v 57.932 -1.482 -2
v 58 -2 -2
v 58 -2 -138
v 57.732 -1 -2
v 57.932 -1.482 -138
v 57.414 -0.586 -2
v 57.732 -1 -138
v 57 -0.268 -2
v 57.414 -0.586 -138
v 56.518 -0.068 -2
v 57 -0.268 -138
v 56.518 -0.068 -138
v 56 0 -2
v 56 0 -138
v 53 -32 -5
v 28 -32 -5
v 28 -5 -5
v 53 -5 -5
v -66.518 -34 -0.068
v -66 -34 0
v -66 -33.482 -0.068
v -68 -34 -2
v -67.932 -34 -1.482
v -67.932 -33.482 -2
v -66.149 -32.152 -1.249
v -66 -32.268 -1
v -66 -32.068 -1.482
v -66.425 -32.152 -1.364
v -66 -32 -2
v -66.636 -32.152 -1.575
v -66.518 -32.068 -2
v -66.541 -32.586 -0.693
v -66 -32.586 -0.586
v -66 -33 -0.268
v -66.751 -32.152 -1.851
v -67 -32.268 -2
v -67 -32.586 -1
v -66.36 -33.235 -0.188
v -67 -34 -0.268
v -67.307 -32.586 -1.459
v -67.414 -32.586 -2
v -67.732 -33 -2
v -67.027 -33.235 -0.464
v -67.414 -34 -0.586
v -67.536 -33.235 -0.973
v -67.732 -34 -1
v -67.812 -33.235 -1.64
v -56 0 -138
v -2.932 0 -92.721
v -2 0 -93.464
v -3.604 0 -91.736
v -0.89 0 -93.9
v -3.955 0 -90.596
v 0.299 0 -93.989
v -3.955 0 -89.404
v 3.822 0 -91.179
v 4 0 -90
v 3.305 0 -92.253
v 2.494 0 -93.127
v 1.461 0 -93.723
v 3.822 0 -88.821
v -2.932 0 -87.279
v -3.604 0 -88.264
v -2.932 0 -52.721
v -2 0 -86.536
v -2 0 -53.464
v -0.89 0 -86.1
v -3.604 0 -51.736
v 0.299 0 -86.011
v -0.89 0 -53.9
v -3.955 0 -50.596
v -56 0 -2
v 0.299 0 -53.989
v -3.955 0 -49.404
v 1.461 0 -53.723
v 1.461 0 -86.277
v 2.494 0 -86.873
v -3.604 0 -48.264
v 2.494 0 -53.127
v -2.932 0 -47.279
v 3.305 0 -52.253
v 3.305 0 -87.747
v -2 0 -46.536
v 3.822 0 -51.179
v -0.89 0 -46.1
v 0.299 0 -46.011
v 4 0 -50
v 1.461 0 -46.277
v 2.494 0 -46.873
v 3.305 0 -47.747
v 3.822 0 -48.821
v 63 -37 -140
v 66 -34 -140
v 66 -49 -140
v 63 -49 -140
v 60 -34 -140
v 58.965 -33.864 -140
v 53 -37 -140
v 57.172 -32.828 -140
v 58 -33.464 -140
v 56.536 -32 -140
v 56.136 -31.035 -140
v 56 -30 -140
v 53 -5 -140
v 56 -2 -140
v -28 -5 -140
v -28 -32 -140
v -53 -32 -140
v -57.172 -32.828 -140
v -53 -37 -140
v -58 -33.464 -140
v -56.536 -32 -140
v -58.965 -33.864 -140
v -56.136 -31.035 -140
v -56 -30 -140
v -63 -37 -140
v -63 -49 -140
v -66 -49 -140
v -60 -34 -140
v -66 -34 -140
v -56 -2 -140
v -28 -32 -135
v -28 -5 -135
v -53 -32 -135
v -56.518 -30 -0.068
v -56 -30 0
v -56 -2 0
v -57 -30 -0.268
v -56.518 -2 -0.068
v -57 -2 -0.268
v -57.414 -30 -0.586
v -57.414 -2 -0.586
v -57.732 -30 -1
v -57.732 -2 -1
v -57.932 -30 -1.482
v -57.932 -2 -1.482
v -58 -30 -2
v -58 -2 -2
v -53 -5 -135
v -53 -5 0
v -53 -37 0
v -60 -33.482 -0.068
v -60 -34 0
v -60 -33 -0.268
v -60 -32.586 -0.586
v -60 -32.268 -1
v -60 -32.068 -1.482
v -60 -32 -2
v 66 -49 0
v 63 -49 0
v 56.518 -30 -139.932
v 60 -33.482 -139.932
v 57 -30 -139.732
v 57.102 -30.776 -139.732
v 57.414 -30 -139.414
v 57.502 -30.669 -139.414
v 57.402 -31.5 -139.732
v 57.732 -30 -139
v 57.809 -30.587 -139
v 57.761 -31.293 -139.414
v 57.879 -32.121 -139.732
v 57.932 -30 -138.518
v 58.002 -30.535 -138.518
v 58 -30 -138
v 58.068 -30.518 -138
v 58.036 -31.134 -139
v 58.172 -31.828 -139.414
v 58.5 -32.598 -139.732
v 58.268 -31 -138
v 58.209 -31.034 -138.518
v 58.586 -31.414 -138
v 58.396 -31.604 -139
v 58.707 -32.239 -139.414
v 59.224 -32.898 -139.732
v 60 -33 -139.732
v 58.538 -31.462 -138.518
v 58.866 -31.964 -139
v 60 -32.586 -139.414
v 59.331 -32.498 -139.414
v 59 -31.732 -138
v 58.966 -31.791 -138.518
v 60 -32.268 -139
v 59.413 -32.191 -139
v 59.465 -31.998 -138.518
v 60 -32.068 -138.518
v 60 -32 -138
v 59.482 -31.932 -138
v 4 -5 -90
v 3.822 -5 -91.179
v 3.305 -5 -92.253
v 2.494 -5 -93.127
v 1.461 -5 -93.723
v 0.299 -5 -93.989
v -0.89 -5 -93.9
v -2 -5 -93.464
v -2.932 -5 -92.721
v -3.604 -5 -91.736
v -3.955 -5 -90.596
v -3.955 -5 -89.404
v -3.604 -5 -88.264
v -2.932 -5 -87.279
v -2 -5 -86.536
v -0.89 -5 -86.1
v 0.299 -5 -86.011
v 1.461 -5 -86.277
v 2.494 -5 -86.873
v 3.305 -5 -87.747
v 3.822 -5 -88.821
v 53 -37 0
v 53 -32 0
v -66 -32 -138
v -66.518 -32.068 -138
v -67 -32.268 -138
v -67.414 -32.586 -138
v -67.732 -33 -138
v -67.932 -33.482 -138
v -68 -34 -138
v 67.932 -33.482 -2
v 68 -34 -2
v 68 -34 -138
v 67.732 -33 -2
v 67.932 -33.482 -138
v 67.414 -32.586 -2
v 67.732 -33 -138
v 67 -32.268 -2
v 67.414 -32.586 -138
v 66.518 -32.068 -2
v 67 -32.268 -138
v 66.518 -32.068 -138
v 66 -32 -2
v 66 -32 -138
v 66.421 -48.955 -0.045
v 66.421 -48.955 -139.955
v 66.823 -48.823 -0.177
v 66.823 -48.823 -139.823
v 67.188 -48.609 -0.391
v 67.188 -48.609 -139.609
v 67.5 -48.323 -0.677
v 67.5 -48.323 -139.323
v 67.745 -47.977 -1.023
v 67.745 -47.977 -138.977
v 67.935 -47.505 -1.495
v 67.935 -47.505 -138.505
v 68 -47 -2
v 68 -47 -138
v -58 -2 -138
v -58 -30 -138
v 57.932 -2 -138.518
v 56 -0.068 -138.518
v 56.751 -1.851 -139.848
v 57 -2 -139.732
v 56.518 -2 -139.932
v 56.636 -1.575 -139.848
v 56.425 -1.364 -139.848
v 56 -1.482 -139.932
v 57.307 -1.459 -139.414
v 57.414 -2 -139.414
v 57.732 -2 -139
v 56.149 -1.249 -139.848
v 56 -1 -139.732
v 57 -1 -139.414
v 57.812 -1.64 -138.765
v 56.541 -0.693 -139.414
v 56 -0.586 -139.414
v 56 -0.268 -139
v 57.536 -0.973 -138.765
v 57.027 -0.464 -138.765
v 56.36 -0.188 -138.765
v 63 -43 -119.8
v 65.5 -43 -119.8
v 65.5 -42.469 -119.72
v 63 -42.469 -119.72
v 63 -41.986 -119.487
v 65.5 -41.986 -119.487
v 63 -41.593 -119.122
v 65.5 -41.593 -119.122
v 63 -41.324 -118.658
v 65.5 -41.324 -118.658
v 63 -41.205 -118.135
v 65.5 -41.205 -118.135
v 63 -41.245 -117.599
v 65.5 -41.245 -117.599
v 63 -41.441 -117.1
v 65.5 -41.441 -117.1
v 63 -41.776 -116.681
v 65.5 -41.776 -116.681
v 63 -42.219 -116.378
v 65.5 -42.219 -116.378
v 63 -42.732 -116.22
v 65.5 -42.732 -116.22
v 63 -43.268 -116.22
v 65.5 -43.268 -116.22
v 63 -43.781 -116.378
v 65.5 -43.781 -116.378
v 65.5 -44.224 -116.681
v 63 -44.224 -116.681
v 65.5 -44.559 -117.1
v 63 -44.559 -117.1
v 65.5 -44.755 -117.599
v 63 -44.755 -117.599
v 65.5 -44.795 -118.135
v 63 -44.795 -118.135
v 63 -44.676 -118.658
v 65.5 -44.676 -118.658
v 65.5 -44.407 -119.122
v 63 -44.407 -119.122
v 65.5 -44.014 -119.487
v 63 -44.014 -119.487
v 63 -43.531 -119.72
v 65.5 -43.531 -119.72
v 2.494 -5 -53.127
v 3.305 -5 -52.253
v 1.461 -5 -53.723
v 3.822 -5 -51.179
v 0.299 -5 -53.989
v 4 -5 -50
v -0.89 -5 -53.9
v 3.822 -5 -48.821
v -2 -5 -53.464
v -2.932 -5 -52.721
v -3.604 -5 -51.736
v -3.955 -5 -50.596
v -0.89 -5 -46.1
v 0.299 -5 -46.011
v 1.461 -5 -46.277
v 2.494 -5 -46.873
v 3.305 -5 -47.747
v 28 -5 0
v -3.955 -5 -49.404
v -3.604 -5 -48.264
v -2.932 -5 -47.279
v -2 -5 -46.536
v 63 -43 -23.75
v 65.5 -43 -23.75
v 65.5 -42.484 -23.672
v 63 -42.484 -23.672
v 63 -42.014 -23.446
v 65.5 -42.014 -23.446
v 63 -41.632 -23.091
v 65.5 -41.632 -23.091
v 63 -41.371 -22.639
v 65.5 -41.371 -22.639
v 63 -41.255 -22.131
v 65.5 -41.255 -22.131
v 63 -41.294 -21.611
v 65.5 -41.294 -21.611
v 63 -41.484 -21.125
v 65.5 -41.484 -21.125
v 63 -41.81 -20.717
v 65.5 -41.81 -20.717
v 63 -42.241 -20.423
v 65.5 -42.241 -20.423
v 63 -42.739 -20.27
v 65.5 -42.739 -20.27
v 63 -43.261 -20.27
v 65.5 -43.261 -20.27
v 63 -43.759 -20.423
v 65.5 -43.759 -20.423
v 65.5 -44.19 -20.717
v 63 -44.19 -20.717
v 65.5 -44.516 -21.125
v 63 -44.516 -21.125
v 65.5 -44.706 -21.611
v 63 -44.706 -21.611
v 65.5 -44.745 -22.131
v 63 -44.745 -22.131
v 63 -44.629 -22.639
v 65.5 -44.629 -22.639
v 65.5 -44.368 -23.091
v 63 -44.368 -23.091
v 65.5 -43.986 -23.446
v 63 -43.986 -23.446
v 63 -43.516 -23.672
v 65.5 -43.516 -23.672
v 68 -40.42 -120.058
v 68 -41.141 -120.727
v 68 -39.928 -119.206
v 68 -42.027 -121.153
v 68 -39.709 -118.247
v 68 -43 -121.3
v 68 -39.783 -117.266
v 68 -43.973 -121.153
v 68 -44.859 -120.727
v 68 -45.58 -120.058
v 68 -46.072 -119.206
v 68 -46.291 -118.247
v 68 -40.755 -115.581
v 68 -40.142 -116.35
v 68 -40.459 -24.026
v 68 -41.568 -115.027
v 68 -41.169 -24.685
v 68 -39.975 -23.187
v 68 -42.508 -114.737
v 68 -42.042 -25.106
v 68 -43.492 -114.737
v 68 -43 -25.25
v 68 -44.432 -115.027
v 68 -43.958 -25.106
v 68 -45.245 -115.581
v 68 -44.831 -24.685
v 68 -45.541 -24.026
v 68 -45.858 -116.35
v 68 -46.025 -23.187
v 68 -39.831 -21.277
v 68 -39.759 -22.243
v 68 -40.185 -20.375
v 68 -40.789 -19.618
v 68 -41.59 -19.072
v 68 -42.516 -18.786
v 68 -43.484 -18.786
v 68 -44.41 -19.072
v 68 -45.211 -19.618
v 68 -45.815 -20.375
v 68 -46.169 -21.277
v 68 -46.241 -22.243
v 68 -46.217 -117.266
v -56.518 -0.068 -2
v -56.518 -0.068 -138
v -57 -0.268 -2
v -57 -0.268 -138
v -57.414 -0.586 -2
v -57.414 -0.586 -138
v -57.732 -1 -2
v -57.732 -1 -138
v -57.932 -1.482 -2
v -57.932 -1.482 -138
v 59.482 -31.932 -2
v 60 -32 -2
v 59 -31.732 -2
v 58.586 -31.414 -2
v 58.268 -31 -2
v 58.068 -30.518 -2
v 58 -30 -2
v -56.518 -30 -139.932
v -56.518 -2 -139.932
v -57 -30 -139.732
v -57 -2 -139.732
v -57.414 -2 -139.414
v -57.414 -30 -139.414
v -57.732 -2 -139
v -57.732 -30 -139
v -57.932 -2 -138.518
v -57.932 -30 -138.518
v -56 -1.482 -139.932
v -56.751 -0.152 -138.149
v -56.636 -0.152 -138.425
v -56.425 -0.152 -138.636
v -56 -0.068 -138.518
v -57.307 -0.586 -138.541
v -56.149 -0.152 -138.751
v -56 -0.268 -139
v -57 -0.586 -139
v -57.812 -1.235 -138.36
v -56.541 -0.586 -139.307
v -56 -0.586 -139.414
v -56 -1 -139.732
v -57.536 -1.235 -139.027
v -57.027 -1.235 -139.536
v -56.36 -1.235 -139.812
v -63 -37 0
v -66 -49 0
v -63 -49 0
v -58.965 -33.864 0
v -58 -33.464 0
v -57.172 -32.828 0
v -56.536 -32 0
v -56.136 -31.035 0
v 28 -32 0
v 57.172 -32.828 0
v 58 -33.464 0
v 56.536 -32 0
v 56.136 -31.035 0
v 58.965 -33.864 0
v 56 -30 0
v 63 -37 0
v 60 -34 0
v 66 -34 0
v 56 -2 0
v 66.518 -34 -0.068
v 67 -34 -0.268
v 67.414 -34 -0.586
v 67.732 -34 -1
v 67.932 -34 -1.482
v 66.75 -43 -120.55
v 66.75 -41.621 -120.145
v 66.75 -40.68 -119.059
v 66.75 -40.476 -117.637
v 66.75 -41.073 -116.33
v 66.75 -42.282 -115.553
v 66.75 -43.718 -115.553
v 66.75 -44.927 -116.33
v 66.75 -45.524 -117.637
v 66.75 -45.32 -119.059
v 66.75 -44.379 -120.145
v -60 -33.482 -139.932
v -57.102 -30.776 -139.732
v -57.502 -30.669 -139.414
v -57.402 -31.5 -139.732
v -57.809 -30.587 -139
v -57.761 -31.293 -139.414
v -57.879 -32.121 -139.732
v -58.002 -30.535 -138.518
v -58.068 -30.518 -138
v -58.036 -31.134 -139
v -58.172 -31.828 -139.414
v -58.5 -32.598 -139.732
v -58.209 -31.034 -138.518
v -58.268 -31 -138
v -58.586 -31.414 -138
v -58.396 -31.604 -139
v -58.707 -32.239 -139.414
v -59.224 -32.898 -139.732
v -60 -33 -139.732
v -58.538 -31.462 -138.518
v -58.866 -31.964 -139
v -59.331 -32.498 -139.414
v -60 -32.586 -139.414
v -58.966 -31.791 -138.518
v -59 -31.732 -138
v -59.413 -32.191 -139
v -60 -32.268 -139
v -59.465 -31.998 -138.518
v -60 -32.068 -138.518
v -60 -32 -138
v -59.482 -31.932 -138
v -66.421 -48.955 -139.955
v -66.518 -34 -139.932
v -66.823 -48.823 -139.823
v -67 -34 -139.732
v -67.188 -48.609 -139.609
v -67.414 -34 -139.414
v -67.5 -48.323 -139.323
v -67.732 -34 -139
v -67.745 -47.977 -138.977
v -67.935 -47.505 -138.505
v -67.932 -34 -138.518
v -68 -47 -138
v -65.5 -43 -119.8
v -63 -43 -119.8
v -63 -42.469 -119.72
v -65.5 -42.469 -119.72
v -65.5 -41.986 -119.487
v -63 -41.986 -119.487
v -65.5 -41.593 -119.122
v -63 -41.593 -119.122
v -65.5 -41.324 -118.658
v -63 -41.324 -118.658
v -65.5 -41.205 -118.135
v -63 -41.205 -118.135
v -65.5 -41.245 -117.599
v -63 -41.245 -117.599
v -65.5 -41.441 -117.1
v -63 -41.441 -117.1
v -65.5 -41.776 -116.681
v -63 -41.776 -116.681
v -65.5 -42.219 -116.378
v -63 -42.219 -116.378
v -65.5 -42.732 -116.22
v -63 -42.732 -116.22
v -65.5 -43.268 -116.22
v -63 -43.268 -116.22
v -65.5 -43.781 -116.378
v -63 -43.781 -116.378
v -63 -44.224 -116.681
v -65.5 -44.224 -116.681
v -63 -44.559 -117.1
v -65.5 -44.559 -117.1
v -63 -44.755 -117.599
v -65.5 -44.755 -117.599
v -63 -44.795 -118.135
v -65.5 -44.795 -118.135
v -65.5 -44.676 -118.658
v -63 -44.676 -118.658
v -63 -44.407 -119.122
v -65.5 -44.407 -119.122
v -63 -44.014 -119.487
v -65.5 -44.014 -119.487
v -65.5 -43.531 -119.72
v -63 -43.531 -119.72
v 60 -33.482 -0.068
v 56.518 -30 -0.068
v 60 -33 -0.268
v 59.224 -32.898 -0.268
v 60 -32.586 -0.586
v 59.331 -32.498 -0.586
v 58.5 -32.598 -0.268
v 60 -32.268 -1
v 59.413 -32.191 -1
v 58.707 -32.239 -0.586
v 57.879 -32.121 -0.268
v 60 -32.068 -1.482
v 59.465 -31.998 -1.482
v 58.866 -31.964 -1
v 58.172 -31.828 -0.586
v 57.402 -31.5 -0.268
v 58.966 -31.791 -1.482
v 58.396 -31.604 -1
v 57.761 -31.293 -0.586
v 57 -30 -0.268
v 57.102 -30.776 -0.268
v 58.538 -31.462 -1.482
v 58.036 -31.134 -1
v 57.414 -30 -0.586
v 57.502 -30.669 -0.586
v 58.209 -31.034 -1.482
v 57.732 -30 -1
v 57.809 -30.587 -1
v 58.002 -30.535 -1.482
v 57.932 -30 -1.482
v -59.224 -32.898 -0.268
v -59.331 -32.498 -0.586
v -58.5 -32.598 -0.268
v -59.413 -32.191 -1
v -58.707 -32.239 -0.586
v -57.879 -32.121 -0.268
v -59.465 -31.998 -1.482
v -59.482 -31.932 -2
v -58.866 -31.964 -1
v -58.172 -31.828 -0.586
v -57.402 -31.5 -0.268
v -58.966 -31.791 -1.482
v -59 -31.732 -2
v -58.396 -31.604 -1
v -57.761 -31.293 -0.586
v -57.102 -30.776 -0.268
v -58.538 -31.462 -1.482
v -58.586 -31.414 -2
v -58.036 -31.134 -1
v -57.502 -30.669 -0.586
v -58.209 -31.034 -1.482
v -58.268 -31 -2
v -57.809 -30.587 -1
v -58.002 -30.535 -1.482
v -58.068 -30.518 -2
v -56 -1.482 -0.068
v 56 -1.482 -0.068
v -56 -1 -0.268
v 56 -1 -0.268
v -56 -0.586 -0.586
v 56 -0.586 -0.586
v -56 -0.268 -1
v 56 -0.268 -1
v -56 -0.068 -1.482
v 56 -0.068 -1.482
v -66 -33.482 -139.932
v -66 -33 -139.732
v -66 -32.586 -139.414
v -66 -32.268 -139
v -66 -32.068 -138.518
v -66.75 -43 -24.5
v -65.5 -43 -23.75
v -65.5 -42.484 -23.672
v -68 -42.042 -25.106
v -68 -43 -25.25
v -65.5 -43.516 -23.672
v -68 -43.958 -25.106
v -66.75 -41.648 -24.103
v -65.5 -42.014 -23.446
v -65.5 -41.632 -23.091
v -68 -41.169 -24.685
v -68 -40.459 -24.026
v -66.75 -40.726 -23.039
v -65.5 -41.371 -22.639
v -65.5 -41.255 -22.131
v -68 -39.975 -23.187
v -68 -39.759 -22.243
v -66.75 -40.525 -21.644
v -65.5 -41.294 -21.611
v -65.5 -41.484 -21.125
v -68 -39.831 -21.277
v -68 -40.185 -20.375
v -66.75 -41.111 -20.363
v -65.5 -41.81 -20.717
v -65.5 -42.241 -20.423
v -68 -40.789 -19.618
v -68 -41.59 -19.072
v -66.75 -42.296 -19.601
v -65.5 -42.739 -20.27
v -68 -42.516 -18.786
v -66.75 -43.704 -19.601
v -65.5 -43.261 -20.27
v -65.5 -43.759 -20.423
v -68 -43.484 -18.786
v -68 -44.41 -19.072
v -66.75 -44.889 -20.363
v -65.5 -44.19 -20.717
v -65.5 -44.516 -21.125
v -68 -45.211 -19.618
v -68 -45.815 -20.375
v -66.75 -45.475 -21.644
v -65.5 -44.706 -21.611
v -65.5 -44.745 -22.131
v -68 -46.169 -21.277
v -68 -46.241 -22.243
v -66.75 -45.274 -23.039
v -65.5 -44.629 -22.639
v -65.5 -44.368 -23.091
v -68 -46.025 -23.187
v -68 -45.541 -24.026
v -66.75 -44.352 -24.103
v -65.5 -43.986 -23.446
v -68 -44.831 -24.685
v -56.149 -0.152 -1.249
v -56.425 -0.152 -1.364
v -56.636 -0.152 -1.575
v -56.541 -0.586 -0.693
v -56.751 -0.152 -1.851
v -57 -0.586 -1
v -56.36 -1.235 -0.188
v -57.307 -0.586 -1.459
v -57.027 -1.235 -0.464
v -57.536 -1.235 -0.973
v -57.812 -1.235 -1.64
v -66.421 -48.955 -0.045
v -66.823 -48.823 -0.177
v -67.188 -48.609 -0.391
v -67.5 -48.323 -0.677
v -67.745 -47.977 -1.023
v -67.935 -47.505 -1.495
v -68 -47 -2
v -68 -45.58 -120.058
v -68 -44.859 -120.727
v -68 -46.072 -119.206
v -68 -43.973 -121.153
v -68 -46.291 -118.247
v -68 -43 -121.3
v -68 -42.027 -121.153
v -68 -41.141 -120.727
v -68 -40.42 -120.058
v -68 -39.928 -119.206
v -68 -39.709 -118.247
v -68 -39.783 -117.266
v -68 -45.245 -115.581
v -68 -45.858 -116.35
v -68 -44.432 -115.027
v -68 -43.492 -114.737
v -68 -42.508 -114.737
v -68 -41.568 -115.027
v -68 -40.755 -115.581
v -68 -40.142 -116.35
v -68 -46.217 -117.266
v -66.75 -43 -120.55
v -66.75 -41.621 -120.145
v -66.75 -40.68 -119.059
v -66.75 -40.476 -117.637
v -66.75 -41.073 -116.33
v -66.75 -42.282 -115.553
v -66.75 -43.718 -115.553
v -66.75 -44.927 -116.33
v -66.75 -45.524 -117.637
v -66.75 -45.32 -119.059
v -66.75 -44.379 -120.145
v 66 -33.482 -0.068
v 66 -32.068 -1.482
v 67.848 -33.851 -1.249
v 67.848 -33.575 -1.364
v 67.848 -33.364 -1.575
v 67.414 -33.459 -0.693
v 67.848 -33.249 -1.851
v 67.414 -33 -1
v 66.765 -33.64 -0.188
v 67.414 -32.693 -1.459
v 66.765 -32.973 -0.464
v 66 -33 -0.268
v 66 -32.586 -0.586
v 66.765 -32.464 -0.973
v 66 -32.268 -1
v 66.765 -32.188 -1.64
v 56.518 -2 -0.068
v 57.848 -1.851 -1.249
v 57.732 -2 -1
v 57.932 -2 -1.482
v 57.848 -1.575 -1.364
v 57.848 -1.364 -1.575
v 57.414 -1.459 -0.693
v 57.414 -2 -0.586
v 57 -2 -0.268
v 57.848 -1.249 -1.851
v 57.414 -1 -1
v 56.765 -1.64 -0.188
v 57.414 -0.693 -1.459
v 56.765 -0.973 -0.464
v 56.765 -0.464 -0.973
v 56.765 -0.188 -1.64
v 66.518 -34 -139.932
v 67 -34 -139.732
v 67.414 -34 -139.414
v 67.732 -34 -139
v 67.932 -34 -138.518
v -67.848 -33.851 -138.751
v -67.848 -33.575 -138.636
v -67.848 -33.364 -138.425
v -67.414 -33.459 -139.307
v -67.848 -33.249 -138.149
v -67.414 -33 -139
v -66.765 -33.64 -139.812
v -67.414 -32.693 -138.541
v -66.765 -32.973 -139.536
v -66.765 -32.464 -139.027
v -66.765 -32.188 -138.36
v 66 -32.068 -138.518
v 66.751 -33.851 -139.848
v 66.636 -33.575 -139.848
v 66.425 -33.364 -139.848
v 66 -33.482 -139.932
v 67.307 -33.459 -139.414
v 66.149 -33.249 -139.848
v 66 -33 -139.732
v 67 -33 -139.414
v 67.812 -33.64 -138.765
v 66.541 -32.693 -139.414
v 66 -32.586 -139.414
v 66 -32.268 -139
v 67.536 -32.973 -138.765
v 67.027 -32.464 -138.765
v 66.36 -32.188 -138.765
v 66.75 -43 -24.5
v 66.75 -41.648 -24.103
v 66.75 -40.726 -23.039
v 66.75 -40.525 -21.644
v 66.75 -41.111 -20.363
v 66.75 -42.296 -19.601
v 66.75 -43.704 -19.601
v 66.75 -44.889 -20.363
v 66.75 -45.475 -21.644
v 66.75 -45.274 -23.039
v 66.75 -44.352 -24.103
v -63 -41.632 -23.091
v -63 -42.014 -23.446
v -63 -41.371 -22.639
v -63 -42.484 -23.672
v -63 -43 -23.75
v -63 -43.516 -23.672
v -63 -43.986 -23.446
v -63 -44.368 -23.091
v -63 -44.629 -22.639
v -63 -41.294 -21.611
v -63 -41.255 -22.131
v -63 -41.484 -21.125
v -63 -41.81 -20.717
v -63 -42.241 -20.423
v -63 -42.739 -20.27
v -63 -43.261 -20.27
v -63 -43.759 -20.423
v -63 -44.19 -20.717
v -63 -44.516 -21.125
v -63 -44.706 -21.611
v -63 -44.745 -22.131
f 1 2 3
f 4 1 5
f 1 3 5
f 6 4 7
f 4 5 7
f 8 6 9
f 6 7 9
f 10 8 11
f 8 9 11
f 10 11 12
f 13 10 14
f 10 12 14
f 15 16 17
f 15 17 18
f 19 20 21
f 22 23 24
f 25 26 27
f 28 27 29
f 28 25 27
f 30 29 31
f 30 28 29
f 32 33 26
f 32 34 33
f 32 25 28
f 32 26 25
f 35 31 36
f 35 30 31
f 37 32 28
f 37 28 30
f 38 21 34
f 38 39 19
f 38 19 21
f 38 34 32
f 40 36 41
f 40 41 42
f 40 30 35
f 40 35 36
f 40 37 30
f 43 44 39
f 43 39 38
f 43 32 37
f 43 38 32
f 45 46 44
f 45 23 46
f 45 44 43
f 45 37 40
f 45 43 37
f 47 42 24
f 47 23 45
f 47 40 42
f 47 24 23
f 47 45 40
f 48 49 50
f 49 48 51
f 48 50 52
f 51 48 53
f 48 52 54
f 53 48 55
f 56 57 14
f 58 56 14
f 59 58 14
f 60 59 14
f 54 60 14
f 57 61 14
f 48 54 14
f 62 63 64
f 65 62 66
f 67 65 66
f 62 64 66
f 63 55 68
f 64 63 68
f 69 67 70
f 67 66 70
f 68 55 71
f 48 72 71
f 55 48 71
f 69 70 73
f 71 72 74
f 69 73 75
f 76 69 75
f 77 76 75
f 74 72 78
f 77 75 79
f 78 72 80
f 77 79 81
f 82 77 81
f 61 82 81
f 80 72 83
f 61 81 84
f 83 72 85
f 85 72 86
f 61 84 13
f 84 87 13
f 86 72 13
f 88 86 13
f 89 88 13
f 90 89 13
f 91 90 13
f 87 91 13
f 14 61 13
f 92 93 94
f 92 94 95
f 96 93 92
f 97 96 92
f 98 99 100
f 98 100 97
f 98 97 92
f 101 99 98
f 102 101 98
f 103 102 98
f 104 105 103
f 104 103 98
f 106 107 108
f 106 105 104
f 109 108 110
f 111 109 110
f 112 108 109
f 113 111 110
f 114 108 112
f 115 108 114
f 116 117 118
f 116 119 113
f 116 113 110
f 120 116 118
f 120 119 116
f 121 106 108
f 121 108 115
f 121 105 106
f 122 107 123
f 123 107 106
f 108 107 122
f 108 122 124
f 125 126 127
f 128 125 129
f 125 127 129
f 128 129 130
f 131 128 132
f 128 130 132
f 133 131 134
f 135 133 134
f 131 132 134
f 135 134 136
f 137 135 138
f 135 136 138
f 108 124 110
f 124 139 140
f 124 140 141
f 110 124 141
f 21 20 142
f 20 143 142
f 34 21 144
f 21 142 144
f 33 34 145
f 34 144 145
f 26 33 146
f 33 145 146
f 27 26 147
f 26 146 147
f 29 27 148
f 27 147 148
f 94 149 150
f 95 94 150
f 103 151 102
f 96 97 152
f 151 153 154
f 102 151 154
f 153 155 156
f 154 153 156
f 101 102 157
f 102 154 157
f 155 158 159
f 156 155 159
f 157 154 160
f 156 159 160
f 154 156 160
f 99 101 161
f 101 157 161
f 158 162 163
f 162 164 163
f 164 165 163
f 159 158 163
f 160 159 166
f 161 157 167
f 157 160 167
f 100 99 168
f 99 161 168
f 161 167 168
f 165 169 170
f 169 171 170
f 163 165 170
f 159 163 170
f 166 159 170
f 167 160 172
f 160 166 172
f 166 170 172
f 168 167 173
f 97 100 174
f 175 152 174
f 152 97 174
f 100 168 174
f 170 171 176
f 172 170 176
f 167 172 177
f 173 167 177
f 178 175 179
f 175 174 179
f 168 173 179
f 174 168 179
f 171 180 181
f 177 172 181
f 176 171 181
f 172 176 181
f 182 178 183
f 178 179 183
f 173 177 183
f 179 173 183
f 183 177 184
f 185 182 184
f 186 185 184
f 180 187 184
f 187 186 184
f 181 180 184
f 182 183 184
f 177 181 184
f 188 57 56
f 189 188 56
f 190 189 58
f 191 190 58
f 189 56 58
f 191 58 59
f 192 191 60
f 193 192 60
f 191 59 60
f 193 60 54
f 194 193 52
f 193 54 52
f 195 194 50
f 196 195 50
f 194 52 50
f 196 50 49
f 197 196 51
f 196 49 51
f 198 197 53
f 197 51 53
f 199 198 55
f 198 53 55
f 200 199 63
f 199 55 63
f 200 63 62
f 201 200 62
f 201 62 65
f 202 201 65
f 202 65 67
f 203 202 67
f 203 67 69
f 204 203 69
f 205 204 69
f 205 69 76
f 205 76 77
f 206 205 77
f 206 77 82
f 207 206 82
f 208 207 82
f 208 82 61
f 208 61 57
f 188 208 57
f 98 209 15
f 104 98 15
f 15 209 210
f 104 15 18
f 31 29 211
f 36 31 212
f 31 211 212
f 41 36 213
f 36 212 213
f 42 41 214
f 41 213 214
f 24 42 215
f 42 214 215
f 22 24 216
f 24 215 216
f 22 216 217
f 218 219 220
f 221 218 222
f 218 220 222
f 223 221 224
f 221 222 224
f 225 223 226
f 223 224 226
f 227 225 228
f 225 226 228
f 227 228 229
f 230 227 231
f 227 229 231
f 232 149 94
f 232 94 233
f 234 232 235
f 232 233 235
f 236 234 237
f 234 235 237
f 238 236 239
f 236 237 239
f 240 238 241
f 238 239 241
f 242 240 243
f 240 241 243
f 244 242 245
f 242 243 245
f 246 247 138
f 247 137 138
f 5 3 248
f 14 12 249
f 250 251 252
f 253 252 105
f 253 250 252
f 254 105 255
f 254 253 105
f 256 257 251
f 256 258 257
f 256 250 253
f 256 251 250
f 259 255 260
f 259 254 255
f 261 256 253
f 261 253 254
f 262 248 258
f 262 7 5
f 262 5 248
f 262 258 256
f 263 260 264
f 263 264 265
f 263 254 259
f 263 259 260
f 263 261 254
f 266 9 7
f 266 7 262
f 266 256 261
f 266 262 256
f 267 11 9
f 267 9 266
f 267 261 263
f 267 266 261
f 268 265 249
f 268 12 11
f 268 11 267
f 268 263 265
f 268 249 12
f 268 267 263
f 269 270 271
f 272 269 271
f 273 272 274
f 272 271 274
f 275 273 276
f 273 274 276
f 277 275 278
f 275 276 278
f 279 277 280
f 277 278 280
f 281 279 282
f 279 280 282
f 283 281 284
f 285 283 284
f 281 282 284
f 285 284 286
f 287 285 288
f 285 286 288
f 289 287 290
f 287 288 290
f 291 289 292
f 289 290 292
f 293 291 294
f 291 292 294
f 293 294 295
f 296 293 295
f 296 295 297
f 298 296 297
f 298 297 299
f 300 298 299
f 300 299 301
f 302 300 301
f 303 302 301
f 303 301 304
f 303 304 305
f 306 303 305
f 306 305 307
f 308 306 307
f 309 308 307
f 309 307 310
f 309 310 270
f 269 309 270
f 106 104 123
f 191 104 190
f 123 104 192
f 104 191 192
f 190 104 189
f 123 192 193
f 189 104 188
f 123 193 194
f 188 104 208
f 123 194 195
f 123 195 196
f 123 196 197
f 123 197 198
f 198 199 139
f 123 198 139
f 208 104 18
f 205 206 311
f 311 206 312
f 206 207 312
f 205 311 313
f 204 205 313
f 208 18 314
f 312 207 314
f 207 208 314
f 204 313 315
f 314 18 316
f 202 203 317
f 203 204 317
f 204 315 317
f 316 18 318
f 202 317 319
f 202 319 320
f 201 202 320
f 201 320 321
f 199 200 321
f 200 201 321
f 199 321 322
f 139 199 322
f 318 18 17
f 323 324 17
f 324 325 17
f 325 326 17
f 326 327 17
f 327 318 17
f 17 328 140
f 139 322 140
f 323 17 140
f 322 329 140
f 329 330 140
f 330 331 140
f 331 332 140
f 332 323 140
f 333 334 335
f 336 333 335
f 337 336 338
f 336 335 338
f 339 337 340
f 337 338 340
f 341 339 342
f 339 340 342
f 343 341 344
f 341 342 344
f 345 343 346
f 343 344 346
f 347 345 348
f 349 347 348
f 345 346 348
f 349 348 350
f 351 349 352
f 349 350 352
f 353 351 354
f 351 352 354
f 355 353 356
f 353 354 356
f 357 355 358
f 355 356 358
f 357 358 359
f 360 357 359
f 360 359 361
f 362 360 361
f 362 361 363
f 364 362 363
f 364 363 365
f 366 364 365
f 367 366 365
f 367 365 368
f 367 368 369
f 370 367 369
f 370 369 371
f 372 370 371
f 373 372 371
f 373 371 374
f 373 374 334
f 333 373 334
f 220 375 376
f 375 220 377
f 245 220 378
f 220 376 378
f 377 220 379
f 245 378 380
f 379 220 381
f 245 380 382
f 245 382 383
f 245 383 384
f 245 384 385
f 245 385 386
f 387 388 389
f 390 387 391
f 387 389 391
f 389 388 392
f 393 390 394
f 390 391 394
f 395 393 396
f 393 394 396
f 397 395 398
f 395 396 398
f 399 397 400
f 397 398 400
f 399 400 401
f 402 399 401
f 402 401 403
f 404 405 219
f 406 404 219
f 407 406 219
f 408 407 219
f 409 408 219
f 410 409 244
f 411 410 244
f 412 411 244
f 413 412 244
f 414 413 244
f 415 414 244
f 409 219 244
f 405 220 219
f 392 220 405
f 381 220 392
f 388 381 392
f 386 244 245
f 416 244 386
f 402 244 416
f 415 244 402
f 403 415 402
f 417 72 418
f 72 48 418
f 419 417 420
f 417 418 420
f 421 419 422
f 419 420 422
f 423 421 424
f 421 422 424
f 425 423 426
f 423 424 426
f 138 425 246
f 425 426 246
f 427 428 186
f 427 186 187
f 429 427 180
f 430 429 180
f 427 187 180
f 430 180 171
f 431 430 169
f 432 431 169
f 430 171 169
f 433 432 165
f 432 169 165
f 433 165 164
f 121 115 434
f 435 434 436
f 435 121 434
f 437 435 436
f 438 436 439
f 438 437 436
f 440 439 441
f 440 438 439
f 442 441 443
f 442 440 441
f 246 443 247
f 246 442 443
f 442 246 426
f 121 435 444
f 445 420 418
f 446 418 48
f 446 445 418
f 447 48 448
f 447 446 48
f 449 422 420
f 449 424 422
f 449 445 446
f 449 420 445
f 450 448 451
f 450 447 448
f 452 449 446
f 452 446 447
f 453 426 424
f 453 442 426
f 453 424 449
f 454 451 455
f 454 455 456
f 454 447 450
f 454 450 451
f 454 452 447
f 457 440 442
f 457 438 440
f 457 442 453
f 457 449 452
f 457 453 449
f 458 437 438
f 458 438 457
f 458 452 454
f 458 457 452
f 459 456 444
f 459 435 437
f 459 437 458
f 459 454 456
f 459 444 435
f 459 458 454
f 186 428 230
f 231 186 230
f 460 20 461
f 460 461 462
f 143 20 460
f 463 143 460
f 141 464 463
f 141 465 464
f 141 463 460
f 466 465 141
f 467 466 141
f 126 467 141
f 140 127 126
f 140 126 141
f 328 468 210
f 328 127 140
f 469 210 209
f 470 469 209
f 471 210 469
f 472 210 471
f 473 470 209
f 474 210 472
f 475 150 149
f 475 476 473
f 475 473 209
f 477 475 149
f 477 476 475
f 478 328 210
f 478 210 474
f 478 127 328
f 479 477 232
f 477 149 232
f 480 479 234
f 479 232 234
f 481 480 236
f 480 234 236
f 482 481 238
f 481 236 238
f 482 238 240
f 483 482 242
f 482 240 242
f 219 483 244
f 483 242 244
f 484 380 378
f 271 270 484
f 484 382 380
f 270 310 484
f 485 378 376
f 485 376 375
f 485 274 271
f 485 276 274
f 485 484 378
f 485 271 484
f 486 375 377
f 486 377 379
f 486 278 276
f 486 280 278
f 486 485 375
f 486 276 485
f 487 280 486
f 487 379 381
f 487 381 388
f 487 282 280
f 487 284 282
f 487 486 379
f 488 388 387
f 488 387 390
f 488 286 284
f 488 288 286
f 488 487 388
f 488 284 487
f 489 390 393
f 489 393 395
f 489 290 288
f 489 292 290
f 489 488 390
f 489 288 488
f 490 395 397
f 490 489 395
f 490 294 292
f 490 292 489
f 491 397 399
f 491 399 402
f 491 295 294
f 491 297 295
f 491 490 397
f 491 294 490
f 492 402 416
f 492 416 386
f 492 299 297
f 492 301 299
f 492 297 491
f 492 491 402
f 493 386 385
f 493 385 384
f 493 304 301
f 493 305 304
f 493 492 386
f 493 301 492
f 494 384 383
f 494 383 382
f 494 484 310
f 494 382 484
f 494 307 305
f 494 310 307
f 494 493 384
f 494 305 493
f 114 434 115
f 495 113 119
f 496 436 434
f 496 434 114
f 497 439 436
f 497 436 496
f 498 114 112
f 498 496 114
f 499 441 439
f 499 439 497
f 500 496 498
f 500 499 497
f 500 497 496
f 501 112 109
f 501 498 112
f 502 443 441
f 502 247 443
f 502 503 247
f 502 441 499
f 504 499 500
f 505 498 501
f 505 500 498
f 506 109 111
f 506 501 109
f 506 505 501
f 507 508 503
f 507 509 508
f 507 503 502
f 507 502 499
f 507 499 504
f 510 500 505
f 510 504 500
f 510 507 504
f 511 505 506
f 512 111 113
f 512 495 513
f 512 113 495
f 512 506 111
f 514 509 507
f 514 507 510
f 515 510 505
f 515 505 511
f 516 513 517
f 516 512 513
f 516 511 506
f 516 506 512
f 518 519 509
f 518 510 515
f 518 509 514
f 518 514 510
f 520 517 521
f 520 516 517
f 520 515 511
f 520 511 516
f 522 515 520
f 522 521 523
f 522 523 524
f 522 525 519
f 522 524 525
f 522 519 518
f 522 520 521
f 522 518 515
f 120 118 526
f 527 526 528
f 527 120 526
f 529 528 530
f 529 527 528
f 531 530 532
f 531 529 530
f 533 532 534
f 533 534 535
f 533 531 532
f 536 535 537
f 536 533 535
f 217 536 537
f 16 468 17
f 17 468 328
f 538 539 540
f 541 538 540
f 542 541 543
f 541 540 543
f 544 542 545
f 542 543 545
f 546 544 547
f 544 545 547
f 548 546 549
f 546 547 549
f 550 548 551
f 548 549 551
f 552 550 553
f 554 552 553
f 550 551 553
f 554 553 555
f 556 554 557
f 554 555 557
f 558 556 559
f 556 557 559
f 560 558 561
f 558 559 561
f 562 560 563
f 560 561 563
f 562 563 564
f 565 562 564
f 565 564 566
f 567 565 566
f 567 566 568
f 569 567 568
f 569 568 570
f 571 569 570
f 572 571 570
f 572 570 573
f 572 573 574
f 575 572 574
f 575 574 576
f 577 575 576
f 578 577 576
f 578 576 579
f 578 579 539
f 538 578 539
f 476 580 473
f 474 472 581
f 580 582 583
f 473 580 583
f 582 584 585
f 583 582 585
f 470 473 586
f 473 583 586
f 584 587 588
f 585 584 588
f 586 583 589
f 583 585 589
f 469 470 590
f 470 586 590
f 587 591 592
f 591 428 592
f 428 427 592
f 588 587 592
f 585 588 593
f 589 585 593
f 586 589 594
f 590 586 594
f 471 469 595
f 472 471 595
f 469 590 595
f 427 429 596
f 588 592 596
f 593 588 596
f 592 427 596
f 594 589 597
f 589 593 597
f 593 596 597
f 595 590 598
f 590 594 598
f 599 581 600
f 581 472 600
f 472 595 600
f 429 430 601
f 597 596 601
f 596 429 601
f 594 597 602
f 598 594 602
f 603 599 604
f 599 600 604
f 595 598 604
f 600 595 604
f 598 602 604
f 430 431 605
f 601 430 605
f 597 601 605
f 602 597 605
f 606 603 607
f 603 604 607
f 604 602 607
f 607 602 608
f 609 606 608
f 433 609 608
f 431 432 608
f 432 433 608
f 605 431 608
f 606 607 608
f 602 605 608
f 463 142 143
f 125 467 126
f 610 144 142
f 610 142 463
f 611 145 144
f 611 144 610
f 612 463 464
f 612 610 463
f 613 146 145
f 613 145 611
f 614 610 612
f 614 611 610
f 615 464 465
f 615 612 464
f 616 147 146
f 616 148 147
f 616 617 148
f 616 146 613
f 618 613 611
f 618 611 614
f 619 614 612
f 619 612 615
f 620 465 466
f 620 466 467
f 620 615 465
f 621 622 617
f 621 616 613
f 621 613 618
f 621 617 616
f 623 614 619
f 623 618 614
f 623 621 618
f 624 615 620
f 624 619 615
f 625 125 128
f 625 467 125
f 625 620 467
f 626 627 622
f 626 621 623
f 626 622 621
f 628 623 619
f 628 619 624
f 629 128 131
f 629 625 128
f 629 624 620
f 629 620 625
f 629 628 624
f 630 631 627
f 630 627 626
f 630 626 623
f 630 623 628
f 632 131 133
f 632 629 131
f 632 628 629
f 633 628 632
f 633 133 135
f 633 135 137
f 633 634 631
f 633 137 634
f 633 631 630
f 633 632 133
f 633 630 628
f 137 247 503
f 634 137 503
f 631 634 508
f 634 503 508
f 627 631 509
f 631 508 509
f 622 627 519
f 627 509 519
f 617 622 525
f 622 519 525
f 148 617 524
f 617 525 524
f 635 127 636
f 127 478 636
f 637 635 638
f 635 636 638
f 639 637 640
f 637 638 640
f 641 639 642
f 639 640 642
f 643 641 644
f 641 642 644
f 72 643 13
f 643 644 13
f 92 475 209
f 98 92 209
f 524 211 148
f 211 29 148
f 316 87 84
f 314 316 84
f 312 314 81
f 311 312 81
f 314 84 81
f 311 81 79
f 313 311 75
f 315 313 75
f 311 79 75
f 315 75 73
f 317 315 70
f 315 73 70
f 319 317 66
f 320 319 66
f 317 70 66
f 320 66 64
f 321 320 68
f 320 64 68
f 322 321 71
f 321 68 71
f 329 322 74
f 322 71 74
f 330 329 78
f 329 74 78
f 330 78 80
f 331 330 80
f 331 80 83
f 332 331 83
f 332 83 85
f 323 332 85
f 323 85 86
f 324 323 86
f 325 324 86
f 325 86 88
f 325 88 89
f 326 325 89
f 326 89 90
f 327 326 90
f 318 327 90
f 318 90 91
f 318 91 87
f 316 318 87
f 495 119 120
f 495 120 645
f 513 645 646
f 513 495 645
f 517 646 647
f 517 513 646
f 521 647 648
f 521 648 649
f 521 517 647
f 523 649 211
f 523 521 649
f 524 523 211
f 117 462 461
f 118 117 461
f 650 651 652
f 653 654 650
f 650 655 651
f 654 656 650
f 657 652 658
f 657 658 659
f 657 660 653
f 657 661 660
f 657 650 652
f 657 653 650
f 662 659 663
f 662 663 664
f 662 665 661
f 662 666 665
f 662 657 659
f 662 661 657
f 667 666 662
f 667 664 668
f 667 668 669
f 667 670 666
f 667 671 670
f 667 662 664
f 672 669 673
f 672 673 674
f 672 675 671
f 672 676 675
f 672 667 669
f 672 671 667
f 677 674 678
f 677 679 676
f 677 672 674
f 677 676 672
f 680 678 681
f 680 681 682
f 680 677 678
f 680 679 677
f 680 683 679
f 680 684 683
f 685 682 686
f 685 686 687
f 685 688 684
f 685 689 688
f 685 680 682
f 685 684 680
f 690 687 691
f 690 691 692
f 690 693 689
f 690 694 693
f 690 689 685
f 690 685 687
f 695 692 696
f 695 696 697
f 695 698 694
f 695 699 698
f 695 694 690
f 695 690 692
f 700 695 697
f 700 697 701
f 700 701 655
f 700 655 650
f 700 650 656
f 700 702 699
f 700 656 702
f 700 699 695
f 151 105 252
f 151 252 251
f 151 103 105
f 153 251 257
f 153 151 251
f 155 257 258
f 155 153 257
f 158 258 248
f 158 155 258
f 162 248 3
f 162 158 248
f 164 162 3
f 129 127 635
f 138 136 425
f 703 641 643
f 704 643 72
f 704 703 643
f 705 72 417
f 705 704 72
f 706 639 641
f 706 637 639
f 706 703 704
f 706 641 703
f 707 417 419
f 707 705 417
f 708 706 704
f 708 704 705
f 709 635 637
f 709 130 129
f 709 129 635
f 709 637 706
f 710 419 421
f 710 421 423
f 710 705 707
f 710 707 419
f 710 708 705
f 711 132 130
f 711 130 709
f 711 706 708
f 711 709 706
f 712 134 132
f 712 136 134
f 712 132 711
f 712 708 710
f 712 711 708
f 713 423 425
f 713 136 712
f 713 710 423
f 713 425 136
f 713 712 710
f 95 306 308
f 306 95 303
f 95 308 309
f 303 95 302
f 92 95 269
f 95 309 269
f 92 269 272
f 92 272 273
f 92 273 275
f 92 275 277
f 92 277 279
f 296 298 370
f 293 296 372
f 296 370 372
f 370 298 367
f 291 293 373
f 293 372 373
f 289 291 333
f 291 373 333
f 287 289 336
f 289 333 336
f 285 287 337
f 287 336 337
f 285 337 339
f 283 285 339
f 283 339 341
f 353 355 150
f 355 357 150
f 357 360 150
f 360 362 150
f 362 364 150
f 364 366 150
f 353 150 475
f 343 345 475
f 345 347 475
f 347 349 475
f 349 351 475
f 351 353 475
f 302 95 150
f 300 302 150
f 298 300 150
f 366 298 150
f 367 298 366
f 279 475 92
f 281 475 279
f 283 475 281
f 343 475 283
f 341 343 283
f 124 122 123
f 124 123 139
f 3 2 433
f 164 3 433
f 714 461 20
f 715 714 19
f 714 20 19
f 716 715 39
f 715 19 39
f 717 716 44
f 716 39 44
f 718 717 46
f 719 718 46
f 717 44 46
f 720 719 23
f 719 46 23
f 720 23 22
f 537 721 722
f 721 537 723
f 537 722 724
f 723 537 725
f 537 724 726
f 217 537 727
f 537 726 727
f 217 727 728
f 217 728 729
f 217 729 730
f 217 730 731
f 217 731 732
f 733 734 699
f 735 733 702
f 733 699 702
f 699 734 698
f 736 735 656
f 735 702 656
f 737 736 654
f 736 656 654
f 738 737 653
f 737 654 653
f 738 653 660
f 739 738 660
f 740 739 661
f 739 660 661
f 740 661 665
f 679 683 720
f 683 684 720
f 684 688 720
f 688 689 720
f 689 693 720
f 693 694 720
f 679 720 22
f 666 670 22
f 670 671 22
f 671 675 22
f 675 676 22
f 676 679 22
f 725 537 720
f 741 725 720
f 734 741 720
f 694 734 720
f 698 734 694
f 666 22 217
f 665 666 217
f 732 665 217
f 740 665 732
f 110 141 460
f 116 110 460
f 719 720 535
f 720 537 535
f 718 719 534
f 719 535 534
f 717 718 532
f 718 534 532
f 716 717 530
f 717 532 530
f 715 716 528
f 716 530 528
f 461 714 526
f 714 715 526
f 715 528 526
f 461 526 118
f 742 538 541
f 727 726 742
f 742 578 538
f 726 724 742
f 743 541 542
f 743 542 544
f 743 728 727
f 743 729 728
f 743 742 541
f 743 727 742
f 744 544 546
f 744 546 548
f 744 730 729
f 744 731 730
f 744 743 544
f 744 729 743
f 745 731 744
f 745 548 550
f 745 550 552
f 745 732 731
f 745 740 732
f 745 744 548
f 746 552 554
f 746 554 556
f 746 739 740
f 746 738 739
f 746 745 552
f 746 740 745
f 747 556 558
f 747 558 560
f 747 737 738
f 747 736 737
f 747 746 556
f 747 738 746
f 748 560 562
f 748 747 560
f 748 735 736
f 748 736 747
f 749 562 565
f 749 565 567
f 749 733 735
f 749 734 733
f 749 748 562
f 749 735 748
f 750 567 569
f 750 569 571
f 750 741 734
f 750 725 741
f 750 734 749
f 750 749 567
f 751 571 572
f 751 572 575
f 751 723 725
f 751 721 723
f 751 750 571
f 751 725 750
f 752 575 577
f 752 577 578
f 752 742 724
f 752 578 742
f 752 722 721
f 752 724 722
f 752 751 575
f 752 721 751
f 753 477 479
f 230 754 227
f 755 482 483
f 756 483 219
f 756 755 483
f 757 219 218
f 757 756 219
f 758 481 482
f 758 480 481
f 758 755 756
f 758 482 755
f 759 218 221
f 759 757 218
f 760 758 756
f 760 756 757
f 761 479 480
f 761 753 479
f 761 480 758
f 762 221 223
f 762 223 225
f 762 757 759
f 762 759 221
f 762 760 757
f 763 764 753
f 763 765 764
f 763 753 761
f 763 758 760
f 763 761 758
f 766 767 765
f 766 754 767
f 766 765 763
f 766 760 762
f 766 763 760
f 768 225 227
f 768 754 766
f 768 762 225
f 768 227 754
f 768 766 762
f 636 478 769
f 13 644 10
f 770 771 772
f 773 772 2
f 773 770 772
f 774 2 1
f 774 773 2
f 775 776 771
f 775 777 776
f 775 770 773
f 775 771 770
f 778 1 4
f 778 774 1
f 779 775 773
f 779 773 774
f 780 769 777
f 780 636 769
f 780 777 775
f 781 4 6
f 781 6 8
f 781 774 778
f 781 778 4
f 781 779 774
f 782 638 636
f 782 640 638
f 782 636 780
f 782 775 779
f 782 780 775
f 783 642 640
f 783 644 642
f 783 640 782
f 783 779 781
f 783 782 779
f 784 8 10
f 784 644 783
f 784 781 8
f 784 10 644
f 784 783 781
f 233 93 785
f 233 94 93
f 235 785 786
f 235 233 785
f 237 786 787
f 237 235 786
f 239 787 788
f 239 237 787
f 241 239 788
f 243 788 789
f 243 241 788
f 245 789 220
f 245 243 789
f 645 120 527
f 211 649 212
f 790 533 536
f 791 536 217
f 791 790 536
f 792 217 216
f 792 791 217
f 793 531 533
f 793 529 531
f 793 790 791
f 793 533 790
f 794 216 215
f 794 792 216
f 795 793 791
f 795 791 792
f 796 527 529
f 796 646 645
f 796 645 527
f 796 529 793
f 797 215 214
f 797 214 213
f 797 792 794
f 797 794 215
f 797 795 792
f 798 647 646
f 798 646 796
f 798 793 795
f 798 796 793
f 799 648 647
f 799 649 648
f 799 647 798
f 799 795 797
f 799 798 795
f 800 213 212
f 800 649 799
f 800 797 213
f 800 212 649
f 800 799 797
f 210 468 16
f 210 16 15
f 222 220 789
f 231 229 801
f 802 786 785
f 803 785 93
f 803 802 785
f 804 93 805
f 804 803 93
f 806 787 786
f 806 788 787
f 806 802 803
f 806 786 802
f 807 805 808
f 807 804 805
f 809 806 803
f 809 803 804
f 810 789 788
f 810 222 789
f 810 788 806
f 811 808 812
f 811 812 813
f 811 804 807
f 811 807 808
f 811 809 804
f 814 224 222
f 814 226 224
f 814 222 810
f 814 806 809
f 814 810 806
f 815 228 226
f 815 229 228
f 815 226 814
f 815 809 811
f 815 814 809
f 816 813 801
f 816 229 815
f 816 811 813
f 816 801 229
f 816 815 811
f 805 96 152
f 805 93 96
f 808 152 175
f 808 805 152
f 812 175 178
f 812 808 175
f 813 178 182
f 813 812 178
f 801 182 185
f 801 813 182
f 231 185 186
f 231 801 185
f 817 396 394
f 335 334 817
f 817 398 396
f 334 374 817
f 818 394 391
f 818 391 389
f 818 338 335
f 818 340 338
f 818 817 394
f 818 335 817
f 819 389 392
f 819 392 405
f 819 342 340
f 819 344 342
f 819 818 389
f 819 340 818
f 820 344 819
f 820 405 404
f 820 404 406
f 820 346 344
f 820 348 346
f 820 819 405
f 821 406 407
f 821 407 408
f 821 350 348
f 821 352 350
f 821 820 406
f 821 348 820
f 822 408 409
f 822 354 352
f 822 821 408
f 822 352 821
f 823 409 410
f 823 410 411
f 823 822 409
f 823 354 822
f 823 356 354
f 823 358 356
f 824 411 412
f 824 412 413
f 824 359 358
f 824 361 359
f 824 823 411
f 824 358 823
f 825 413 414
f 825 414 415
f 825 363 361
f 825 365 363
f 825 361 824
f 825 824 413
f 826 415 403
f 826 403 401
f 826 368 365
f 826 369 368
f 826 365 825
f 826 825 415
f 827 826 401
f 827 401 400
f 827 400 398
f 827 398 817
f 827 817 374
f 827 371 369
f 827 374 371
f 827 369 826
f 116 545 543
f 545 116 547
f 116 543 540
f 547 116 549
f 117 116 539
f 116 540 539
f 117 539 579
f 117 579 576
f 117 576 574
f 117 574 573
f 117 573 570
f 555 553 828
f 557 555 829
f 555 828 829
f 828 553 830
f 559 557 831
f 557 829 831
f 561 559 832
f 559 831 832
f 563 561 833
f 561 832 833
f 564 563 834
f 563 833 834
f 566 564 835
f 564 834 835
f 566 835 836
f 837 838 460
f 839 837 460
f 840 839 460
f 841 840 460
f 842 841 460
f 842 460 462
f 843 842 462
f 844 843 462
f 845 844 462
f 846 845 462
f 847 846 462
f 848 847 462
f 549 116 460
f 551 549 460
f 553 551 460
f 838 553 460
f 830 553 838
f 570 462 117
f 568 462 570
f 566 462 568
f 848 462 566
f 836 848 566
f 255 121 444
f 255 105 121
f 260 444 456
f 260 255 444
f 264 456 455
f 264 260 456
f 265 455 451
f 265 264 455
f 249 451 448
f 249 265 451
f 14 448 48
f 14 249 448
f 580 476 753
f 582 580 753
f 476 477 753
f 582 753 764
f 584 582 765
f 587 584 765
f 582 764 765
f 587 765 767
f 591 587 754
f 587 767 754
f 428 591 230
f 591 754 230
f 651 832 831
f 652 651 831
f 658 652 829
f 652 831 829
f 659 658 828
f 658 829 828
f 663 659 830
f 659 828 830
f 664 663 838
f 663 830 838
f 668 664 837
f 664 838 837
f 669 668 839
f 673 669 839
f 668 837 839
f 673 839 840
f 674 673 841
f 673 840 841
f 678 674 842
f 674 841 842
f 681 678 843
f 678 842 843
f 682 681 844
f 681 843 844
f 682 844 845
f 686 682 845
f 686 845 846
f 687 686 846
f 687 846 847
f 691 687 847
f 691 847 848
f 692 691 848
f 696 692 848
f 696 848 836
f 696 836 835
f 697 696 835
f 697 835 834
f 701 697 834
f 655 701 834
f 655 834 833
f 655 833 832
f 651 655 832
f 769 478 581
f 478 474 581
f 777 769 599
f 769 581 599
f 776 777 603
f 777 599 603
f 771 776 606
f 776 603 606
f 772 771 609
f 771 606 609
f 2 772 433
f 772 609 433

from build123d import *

# Parameters (mm, degrees)
BOSS_EXTRUDE1_DEPTH   = 140
SKETCH4_W             = 25
SKETCH4_H             = 27
BOSS_EXTRUDE2_DEPTH   = 5
SKETCH5_W             = 25
SKETCH5_H             = 27
BOSS_EXTRUDE3_DEPTH   = 5
FILLET1_R             = 2
SKETCH6_R             = 1.75
SKETCH6_R_2           = 1.8
CUT_EXTRUDE1_DEPTH    = 137
CHAMFER1_SIZE         = 1.5
CHAMFER1_SIZE2        = 2.5
CHAMFER2_SIZE         = 2.5
CHAMFER2_SIZE2        = 1.5
CHAMFER2_PART_2_SIZE  = 2.5
CHAMFER2_PART_2_SIZE2 = 1.5
SKETCH8_R             = 4
CUT_EXTRUDE2_DEPTH    = 50


with BuildPart() as part:
    # Sketch3 → Boss-Extrude1 (new body)
    with BuildSketch(Plane.XY):
        Polygon((-58, 0), (58, 0), (58, -32), (68, -32), (68, -49), (63, -49), (63, -37), (53, -37), (53, -5), (-53, -5), (-53, -37), (-63, -37), (-63, -49), (-68, -49), (-68, -32), (-58, -32), align=None)
    extrude(amount=-BOSS_EXTRUDE1_DEPTH)

    # Sketch4 → Boss-Extrude2 (add)
    with BuildSketch(Plane.XY):
        with Locations((40.5, -18.5)):
            Rectangle(SKETCH4_W, SKETCH4_H)
    extrude(amount=-BOSS_EXTRUDE2_DEPTH)

    # Sketch5 → Boss-Extrude3 (add)
    with BuildSketch(Plane(origin=(0, 0, -140), x_dir=(-1, 0, 0), z_dir=(0, 0, -1))):
        with Locations((40.5, -18.5)):
            Rectangle(SKETCH5_W, SKETCH5_H)
    extrude(amount=-BOSS_EXTRUDE3_DEPTH)

    # Fillet1
    fillet1_edges = [part.edges().sort_by_distance(p)[0] for p in [
        (-58, -16, -140),
        (63, -32, 0),
        (68, -40.5, 0),
        (-63, -32, -140),
        (-68, -40.5, 0),
        (-63, -32, 0),
        (-68, -40.5, -140),
        (-58, -16, 0),
        (0, 0, 0),
        (58, -16, 0),
        (58, -32, -70),
        (68, -32, -70),
        (68, -49, -70),
        (-68, -49, -70),
        (-68, -32, -70),
        (-58, -32, -70),
        (-58, 0, -70),
        (58, 0, -70),
        (58, -16, -140),
        (68, -40.5, -140),
        (63, -32, -140),
        (0, 0, -140),
    ]]
    fillet(fillet1_edges, radius=FILLET1_R)

    # Sketch6 → Cut-Extrude1 (cut, through all)
    with BuildSketch(Plane(origin=(68, 0, 0), x_dir=(0, 0, -1), z_dir=(1, 0, 0))):
        with Locations((22, -43)):
            Circle(SKETCH6_R)
        with Locations((118, -43)):
            Circle(SKETCH6_R_2)
    extrude(amount=-CUT_EXTRUDE1_DEPTH, mode=Mode.SUBTRACT)

    # Chamfer1
    chamfer1_edges = [part.edges().sort_by_distance(p)[0] for p in [
        (68, -43, -20.25),
        (68, -43, -116.2),
    ]]
    chamfer1_side = [part.faces().sort_by_distance(p)[0] for p in [
        (68, -40.471685324, -69.984689184),
    ]]
    chamfer(chamfer1_edges, length=CHAMFER1_SIZE, length2=CHAMFER1_SIZE2, reference=chamfer1_side[0])

    # Chamfer2
    chamfer2_edges = [part.edges().sort_by_distance(p)[0] for p in [
        (-68, -43, -20.25),
    ]]
    chamfer2_side = [part.faces().sort_by_distance(p)[0] for p in [
        (-65.5, -43, -20.25),
    ]]
    chamfer(chamfer2_edges, length=CHAMFER2_SIZE, length2=CHAMFER2_SIZE2, reference=chamfer2_side[0])

    # Chamfer2 part 2
    chamfer2_part_2_edges = [part.edges().sort_by_distance(p)[0] for p in [
        (-68, -43, -116.2),
    ]]
    chamfer2_part_2_side = [part.faces().sort_by_distance(p)[0] for p in [
        (-65.5, -43, -116.2),
    ]]
    chamfer(chamfer2_part_2_edges, length=CHAMFER2_PART_2_SIZE, length2=CHAMFER2_PART_2_SIZE2, reference=chamfer2_part_2_side[0])

    # Sketch8 → Cut-Extrude2 (cut, through all)
    with BuildSketch(Plane(origin=(0, 0, 0), x_dir=(1, 0, 0), z_dir=(0, 1, 0))):
        with Locations((0, 90)):
            Circle(SKETCH8_R)
        with Locations((0, 50)):
            Circle(SKETCH8_R)
    extrude(amount=-CUT_EXTRUDE2_DEPTH, mode=Mode.SUBTRACT)


solid = part.part
